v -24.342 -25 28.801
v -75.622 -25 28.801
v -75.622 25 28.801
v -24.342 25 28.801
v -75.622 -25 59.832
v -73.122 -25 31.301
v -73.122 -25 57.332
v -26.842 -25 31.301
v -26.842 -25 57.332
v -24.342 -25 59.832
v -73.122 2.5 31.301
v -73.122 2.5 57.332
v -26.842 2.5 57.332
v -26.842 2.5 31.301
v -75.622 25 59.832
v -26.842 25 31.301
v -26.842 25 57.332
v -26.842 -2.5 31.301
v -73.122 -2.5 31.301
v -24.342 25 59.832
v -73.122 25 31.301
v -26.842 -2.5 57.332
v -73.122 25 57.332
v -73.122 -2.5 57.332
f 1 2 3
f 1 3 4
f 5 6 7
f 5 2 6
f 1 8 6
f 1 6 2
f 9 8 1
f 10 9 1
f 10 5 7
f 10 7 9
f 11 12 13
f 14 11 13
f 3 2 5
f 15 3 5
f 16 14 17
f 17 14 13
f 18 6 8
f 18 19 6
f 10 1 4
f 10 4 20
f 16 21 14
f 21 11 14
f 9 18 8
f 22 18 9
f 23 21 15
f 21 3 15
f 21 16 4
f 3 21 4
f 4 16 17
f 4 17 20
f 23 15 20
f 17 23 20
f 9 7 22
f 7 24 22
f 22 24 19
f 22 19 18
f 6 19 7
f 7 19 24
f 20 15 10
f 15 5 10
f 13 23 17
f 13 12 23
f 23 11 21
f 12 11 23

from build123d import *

# Parameters (mm, degrees)
F0_W     = 51.280171
F0_H     = 31.031217
F1_DEPTH = 25
F2_T     = -2.5


with BuildPart() as f1:
    # F0 (on Front) → F1 (new body)
    with BuildSketch(Plane.XZ):
        with Locations((-49.981937, 44.316455)):
            Rectangle(F0_W, F0_H)
    extrude(amount=F1_DEPTH)

    # F2
    f2_openings = [f1.faces().sort_by_distance(p)[0] for p in [
        (-49.981937, -25, 44.316456),
    ]]
    offset(amount=F2_T, openings=f2_openings)

    # F3: F1 across face


with BuildPart() as f1_1:
    add(f1.part)
    add(f1.part.mirror(Plane(origin=(-49.981937, 0, 44.316456), x_dir=(1, 0, 0), z_dir=(0, 1, 0))))


solid = f1_1.part
